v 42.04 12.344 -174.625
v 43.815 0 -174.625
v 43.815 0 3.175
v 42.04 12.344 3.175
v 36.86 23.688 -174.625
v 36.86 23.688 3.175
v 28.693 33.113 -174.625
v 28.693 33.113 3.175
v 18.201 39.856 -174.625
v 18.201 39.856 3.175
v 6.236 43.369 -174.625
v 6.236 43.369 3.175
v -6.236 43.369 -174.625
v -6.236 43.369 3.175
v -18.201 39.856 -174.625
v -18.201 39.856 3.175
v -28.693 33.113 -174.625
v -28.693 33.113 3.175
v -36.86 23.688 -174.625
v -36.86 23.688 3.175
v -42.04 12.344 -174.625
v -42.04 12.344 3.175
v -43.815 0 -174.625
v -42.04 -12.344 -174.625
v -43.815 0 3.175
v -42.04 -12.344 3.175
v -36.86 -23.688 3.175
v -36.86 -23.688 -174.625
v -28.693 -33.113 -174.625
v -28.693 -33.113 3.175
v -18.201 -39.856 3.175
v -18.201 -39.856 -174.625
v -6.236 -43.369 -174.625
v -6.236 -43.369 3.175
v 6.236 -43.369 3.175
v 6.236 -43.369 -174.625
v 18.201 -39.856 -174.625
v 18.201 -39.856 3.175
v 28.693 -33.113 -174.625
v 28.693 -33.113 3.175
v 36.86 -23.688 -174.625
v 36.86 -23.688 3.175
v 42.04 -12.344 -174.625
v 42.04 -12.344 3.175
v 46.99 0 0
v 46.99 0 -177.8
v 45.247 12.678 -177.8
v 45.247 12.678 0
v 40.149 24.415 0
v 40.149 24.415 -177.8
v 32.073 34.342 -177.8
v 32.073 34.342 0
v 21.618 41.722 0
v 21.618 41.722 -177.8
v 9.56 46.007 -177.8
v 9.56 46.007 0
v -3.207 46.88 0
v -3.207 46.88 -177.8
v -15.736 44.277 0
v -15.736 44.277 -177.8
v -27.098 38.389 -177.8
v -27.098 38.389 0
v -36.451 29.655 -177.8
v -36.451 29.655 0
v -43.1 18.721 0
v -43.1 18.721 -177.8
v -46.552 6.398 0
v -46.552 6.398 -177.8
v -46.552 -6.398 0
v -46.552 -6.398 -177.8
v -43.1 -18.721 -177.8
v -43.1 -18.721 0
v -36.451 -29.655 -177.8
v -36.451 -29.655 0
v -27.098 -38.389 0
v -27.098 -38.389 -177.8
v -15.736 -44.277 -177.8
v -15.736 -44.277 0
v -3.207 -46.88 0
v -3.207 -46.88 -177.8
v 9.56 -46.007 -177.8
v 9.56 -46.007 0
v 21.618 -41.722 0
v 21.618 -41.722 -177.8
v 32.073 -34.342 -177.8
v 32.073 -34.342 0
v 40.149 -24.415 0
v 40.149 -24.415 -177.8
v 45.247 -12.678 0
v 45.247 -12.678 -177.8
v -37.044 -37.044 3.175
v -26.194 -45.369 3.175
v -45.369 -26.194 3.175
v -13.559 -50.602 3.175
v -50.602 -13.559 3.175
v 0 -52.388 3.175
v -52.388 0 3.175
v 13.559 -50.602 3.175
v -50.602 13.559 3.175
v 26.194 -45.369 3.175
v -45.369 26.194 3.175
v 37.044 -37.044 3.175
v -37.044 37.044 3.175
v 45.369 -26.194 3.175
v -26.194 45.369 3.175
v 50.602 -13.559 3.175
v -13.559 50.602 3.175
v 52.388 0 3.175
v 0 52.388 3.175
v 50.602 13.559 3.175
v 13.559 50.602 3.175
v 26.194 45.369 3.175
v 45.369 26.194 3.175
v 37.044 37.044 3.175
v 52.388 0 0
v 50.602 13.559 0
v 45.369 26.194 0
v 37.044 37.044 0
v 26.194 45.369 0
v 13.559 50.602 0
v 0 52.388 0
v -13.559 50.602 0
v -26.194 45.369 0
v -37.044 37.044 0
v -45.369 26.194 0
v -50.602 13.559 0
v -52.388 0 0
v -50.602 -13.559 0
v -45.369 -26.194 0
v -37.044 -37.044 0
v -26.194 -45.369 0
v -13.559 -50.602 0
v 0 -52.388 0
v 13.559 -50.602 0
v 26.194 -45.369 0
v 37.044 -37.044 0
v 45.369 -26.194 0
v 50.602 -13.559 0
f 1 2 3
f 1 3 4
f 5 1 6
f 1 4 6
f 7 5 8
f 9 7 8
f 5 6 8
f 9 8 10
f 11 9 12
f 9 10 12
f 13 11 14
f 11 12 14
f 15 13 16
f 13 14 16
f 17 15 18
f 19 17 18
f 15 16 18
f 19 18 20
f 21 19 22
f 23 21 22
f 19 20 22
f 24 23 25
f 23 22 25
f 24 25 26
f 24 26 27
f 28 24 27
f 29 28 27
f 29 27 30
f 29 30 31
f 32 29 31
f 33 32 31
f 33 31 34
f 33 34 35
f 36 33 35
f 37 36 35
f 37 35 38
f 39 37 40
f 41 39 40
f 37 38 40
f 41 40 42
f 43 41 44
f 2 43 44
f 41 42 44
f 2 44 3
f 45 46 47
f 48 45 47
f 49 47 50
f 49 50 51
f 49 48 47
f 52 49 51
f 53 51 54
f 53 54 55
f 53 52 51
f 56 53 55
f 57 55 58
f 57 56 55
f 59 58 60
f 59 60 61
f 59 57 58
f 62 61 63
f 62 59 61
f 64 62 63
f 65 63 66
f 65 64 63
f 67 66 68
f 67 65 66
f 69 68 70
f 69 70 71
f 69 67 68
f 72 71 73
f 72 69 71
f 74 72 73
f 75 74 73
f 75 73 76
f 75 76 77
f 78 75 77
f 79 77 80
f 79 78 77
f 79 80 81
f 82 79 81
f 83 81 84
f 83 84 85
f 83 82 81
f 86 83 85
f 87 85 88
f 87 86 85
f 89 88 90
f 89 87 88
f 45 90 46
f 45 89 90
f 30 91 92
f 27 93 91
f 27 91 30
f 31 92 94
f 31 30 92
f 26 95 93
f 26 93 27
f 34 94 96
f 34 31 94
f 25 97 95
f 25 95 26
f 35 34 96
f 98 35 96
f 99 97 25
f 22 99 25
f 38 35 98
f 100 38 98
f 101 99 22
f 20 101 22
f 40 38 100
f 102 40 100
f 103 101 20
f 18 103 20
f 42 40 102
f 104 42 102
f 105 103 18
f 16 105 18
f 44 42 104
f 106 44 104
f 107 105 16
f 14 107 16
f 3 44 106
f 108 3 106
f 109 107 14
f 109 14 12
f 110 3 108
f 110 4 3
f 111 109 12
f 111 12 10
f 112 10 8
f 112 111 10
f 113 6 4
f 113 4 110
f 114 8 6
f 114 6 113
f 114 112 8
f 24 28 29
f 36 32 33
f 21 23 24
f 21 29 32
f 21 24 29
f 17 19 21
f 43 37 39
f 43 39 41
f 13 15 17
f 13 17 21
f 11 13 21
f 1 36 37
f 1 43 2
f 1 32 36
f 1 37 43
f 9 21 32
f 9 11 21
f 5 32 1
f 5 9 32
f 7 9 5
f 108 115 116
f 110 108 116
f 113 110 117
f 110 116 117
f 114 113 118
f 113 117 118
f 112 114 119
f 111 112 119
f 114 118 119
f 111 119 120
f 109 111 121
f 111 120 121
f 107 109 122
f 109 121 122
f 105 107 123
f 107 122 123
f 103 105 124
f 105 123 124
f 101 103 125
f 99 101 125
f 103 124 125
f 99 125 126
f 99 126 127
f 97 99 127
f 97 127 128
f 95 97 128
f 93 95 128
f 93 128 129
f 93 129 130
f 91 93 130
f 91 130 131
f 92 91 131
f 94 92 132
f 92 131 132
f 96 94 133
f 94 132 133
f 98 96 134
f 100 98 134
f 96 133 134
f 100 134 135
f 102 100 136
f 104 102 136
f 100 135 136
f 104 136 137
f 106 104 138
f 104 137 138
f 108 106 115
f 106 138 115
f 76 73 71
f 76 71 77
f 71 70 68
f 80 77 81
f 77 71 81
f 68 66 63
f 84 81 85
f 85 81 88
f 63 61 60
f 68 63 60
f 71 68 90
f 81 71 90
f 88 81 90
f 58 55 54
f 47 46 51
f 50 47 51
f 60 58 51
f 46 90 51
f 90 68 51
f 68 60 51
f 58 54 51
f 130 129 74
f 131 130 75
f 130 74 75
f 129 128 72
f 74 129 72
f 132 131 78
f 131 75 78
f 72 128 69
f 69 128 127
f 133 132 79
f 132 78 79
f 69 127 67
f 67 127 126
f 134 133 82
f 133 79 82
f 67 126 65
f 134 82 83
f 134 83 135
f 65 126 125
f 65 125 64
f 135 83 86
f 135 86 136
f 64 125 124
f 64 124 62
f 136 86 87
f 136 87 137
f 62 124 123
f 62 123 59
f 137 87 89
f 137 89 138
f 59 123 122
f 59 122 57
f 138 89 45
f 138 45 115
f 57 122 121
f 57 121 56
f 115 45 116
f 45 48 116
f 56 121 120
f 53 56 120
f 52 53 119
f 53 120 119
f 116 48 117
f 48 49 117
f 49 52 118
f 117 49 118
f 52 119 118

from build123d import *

# Parameters (mm, degrees)
F0_R     = 52.3875
F1_DEPTH = 3.175
F2_R     = 46.99
F3_DEPTH = 177.8
F5_R     = 43.815
F6_DEPTH = 177.8


with BuildPart() as f1:
    # F0 (on Top) → F1 (new body)
    with BuildSketch(Plane.XY):
        Circle(F0_R)
    extrude(amount=F1_DEPTH)

    # F2 (on Top) → F3 (join)
    with BuildSketch(Plane.XY):
        Circle(F2_R)
    extrude(amount=-F3_DEPTH)

    # F5 (on offset) → F6 (cut)
    with BuildSketch(Plane.XY.offset(3.175)):
        Circle(F5_R)
    extrude(amount=-F6_DEPTH, mode=Mode.SUBTRACT)


solid = f1.part
